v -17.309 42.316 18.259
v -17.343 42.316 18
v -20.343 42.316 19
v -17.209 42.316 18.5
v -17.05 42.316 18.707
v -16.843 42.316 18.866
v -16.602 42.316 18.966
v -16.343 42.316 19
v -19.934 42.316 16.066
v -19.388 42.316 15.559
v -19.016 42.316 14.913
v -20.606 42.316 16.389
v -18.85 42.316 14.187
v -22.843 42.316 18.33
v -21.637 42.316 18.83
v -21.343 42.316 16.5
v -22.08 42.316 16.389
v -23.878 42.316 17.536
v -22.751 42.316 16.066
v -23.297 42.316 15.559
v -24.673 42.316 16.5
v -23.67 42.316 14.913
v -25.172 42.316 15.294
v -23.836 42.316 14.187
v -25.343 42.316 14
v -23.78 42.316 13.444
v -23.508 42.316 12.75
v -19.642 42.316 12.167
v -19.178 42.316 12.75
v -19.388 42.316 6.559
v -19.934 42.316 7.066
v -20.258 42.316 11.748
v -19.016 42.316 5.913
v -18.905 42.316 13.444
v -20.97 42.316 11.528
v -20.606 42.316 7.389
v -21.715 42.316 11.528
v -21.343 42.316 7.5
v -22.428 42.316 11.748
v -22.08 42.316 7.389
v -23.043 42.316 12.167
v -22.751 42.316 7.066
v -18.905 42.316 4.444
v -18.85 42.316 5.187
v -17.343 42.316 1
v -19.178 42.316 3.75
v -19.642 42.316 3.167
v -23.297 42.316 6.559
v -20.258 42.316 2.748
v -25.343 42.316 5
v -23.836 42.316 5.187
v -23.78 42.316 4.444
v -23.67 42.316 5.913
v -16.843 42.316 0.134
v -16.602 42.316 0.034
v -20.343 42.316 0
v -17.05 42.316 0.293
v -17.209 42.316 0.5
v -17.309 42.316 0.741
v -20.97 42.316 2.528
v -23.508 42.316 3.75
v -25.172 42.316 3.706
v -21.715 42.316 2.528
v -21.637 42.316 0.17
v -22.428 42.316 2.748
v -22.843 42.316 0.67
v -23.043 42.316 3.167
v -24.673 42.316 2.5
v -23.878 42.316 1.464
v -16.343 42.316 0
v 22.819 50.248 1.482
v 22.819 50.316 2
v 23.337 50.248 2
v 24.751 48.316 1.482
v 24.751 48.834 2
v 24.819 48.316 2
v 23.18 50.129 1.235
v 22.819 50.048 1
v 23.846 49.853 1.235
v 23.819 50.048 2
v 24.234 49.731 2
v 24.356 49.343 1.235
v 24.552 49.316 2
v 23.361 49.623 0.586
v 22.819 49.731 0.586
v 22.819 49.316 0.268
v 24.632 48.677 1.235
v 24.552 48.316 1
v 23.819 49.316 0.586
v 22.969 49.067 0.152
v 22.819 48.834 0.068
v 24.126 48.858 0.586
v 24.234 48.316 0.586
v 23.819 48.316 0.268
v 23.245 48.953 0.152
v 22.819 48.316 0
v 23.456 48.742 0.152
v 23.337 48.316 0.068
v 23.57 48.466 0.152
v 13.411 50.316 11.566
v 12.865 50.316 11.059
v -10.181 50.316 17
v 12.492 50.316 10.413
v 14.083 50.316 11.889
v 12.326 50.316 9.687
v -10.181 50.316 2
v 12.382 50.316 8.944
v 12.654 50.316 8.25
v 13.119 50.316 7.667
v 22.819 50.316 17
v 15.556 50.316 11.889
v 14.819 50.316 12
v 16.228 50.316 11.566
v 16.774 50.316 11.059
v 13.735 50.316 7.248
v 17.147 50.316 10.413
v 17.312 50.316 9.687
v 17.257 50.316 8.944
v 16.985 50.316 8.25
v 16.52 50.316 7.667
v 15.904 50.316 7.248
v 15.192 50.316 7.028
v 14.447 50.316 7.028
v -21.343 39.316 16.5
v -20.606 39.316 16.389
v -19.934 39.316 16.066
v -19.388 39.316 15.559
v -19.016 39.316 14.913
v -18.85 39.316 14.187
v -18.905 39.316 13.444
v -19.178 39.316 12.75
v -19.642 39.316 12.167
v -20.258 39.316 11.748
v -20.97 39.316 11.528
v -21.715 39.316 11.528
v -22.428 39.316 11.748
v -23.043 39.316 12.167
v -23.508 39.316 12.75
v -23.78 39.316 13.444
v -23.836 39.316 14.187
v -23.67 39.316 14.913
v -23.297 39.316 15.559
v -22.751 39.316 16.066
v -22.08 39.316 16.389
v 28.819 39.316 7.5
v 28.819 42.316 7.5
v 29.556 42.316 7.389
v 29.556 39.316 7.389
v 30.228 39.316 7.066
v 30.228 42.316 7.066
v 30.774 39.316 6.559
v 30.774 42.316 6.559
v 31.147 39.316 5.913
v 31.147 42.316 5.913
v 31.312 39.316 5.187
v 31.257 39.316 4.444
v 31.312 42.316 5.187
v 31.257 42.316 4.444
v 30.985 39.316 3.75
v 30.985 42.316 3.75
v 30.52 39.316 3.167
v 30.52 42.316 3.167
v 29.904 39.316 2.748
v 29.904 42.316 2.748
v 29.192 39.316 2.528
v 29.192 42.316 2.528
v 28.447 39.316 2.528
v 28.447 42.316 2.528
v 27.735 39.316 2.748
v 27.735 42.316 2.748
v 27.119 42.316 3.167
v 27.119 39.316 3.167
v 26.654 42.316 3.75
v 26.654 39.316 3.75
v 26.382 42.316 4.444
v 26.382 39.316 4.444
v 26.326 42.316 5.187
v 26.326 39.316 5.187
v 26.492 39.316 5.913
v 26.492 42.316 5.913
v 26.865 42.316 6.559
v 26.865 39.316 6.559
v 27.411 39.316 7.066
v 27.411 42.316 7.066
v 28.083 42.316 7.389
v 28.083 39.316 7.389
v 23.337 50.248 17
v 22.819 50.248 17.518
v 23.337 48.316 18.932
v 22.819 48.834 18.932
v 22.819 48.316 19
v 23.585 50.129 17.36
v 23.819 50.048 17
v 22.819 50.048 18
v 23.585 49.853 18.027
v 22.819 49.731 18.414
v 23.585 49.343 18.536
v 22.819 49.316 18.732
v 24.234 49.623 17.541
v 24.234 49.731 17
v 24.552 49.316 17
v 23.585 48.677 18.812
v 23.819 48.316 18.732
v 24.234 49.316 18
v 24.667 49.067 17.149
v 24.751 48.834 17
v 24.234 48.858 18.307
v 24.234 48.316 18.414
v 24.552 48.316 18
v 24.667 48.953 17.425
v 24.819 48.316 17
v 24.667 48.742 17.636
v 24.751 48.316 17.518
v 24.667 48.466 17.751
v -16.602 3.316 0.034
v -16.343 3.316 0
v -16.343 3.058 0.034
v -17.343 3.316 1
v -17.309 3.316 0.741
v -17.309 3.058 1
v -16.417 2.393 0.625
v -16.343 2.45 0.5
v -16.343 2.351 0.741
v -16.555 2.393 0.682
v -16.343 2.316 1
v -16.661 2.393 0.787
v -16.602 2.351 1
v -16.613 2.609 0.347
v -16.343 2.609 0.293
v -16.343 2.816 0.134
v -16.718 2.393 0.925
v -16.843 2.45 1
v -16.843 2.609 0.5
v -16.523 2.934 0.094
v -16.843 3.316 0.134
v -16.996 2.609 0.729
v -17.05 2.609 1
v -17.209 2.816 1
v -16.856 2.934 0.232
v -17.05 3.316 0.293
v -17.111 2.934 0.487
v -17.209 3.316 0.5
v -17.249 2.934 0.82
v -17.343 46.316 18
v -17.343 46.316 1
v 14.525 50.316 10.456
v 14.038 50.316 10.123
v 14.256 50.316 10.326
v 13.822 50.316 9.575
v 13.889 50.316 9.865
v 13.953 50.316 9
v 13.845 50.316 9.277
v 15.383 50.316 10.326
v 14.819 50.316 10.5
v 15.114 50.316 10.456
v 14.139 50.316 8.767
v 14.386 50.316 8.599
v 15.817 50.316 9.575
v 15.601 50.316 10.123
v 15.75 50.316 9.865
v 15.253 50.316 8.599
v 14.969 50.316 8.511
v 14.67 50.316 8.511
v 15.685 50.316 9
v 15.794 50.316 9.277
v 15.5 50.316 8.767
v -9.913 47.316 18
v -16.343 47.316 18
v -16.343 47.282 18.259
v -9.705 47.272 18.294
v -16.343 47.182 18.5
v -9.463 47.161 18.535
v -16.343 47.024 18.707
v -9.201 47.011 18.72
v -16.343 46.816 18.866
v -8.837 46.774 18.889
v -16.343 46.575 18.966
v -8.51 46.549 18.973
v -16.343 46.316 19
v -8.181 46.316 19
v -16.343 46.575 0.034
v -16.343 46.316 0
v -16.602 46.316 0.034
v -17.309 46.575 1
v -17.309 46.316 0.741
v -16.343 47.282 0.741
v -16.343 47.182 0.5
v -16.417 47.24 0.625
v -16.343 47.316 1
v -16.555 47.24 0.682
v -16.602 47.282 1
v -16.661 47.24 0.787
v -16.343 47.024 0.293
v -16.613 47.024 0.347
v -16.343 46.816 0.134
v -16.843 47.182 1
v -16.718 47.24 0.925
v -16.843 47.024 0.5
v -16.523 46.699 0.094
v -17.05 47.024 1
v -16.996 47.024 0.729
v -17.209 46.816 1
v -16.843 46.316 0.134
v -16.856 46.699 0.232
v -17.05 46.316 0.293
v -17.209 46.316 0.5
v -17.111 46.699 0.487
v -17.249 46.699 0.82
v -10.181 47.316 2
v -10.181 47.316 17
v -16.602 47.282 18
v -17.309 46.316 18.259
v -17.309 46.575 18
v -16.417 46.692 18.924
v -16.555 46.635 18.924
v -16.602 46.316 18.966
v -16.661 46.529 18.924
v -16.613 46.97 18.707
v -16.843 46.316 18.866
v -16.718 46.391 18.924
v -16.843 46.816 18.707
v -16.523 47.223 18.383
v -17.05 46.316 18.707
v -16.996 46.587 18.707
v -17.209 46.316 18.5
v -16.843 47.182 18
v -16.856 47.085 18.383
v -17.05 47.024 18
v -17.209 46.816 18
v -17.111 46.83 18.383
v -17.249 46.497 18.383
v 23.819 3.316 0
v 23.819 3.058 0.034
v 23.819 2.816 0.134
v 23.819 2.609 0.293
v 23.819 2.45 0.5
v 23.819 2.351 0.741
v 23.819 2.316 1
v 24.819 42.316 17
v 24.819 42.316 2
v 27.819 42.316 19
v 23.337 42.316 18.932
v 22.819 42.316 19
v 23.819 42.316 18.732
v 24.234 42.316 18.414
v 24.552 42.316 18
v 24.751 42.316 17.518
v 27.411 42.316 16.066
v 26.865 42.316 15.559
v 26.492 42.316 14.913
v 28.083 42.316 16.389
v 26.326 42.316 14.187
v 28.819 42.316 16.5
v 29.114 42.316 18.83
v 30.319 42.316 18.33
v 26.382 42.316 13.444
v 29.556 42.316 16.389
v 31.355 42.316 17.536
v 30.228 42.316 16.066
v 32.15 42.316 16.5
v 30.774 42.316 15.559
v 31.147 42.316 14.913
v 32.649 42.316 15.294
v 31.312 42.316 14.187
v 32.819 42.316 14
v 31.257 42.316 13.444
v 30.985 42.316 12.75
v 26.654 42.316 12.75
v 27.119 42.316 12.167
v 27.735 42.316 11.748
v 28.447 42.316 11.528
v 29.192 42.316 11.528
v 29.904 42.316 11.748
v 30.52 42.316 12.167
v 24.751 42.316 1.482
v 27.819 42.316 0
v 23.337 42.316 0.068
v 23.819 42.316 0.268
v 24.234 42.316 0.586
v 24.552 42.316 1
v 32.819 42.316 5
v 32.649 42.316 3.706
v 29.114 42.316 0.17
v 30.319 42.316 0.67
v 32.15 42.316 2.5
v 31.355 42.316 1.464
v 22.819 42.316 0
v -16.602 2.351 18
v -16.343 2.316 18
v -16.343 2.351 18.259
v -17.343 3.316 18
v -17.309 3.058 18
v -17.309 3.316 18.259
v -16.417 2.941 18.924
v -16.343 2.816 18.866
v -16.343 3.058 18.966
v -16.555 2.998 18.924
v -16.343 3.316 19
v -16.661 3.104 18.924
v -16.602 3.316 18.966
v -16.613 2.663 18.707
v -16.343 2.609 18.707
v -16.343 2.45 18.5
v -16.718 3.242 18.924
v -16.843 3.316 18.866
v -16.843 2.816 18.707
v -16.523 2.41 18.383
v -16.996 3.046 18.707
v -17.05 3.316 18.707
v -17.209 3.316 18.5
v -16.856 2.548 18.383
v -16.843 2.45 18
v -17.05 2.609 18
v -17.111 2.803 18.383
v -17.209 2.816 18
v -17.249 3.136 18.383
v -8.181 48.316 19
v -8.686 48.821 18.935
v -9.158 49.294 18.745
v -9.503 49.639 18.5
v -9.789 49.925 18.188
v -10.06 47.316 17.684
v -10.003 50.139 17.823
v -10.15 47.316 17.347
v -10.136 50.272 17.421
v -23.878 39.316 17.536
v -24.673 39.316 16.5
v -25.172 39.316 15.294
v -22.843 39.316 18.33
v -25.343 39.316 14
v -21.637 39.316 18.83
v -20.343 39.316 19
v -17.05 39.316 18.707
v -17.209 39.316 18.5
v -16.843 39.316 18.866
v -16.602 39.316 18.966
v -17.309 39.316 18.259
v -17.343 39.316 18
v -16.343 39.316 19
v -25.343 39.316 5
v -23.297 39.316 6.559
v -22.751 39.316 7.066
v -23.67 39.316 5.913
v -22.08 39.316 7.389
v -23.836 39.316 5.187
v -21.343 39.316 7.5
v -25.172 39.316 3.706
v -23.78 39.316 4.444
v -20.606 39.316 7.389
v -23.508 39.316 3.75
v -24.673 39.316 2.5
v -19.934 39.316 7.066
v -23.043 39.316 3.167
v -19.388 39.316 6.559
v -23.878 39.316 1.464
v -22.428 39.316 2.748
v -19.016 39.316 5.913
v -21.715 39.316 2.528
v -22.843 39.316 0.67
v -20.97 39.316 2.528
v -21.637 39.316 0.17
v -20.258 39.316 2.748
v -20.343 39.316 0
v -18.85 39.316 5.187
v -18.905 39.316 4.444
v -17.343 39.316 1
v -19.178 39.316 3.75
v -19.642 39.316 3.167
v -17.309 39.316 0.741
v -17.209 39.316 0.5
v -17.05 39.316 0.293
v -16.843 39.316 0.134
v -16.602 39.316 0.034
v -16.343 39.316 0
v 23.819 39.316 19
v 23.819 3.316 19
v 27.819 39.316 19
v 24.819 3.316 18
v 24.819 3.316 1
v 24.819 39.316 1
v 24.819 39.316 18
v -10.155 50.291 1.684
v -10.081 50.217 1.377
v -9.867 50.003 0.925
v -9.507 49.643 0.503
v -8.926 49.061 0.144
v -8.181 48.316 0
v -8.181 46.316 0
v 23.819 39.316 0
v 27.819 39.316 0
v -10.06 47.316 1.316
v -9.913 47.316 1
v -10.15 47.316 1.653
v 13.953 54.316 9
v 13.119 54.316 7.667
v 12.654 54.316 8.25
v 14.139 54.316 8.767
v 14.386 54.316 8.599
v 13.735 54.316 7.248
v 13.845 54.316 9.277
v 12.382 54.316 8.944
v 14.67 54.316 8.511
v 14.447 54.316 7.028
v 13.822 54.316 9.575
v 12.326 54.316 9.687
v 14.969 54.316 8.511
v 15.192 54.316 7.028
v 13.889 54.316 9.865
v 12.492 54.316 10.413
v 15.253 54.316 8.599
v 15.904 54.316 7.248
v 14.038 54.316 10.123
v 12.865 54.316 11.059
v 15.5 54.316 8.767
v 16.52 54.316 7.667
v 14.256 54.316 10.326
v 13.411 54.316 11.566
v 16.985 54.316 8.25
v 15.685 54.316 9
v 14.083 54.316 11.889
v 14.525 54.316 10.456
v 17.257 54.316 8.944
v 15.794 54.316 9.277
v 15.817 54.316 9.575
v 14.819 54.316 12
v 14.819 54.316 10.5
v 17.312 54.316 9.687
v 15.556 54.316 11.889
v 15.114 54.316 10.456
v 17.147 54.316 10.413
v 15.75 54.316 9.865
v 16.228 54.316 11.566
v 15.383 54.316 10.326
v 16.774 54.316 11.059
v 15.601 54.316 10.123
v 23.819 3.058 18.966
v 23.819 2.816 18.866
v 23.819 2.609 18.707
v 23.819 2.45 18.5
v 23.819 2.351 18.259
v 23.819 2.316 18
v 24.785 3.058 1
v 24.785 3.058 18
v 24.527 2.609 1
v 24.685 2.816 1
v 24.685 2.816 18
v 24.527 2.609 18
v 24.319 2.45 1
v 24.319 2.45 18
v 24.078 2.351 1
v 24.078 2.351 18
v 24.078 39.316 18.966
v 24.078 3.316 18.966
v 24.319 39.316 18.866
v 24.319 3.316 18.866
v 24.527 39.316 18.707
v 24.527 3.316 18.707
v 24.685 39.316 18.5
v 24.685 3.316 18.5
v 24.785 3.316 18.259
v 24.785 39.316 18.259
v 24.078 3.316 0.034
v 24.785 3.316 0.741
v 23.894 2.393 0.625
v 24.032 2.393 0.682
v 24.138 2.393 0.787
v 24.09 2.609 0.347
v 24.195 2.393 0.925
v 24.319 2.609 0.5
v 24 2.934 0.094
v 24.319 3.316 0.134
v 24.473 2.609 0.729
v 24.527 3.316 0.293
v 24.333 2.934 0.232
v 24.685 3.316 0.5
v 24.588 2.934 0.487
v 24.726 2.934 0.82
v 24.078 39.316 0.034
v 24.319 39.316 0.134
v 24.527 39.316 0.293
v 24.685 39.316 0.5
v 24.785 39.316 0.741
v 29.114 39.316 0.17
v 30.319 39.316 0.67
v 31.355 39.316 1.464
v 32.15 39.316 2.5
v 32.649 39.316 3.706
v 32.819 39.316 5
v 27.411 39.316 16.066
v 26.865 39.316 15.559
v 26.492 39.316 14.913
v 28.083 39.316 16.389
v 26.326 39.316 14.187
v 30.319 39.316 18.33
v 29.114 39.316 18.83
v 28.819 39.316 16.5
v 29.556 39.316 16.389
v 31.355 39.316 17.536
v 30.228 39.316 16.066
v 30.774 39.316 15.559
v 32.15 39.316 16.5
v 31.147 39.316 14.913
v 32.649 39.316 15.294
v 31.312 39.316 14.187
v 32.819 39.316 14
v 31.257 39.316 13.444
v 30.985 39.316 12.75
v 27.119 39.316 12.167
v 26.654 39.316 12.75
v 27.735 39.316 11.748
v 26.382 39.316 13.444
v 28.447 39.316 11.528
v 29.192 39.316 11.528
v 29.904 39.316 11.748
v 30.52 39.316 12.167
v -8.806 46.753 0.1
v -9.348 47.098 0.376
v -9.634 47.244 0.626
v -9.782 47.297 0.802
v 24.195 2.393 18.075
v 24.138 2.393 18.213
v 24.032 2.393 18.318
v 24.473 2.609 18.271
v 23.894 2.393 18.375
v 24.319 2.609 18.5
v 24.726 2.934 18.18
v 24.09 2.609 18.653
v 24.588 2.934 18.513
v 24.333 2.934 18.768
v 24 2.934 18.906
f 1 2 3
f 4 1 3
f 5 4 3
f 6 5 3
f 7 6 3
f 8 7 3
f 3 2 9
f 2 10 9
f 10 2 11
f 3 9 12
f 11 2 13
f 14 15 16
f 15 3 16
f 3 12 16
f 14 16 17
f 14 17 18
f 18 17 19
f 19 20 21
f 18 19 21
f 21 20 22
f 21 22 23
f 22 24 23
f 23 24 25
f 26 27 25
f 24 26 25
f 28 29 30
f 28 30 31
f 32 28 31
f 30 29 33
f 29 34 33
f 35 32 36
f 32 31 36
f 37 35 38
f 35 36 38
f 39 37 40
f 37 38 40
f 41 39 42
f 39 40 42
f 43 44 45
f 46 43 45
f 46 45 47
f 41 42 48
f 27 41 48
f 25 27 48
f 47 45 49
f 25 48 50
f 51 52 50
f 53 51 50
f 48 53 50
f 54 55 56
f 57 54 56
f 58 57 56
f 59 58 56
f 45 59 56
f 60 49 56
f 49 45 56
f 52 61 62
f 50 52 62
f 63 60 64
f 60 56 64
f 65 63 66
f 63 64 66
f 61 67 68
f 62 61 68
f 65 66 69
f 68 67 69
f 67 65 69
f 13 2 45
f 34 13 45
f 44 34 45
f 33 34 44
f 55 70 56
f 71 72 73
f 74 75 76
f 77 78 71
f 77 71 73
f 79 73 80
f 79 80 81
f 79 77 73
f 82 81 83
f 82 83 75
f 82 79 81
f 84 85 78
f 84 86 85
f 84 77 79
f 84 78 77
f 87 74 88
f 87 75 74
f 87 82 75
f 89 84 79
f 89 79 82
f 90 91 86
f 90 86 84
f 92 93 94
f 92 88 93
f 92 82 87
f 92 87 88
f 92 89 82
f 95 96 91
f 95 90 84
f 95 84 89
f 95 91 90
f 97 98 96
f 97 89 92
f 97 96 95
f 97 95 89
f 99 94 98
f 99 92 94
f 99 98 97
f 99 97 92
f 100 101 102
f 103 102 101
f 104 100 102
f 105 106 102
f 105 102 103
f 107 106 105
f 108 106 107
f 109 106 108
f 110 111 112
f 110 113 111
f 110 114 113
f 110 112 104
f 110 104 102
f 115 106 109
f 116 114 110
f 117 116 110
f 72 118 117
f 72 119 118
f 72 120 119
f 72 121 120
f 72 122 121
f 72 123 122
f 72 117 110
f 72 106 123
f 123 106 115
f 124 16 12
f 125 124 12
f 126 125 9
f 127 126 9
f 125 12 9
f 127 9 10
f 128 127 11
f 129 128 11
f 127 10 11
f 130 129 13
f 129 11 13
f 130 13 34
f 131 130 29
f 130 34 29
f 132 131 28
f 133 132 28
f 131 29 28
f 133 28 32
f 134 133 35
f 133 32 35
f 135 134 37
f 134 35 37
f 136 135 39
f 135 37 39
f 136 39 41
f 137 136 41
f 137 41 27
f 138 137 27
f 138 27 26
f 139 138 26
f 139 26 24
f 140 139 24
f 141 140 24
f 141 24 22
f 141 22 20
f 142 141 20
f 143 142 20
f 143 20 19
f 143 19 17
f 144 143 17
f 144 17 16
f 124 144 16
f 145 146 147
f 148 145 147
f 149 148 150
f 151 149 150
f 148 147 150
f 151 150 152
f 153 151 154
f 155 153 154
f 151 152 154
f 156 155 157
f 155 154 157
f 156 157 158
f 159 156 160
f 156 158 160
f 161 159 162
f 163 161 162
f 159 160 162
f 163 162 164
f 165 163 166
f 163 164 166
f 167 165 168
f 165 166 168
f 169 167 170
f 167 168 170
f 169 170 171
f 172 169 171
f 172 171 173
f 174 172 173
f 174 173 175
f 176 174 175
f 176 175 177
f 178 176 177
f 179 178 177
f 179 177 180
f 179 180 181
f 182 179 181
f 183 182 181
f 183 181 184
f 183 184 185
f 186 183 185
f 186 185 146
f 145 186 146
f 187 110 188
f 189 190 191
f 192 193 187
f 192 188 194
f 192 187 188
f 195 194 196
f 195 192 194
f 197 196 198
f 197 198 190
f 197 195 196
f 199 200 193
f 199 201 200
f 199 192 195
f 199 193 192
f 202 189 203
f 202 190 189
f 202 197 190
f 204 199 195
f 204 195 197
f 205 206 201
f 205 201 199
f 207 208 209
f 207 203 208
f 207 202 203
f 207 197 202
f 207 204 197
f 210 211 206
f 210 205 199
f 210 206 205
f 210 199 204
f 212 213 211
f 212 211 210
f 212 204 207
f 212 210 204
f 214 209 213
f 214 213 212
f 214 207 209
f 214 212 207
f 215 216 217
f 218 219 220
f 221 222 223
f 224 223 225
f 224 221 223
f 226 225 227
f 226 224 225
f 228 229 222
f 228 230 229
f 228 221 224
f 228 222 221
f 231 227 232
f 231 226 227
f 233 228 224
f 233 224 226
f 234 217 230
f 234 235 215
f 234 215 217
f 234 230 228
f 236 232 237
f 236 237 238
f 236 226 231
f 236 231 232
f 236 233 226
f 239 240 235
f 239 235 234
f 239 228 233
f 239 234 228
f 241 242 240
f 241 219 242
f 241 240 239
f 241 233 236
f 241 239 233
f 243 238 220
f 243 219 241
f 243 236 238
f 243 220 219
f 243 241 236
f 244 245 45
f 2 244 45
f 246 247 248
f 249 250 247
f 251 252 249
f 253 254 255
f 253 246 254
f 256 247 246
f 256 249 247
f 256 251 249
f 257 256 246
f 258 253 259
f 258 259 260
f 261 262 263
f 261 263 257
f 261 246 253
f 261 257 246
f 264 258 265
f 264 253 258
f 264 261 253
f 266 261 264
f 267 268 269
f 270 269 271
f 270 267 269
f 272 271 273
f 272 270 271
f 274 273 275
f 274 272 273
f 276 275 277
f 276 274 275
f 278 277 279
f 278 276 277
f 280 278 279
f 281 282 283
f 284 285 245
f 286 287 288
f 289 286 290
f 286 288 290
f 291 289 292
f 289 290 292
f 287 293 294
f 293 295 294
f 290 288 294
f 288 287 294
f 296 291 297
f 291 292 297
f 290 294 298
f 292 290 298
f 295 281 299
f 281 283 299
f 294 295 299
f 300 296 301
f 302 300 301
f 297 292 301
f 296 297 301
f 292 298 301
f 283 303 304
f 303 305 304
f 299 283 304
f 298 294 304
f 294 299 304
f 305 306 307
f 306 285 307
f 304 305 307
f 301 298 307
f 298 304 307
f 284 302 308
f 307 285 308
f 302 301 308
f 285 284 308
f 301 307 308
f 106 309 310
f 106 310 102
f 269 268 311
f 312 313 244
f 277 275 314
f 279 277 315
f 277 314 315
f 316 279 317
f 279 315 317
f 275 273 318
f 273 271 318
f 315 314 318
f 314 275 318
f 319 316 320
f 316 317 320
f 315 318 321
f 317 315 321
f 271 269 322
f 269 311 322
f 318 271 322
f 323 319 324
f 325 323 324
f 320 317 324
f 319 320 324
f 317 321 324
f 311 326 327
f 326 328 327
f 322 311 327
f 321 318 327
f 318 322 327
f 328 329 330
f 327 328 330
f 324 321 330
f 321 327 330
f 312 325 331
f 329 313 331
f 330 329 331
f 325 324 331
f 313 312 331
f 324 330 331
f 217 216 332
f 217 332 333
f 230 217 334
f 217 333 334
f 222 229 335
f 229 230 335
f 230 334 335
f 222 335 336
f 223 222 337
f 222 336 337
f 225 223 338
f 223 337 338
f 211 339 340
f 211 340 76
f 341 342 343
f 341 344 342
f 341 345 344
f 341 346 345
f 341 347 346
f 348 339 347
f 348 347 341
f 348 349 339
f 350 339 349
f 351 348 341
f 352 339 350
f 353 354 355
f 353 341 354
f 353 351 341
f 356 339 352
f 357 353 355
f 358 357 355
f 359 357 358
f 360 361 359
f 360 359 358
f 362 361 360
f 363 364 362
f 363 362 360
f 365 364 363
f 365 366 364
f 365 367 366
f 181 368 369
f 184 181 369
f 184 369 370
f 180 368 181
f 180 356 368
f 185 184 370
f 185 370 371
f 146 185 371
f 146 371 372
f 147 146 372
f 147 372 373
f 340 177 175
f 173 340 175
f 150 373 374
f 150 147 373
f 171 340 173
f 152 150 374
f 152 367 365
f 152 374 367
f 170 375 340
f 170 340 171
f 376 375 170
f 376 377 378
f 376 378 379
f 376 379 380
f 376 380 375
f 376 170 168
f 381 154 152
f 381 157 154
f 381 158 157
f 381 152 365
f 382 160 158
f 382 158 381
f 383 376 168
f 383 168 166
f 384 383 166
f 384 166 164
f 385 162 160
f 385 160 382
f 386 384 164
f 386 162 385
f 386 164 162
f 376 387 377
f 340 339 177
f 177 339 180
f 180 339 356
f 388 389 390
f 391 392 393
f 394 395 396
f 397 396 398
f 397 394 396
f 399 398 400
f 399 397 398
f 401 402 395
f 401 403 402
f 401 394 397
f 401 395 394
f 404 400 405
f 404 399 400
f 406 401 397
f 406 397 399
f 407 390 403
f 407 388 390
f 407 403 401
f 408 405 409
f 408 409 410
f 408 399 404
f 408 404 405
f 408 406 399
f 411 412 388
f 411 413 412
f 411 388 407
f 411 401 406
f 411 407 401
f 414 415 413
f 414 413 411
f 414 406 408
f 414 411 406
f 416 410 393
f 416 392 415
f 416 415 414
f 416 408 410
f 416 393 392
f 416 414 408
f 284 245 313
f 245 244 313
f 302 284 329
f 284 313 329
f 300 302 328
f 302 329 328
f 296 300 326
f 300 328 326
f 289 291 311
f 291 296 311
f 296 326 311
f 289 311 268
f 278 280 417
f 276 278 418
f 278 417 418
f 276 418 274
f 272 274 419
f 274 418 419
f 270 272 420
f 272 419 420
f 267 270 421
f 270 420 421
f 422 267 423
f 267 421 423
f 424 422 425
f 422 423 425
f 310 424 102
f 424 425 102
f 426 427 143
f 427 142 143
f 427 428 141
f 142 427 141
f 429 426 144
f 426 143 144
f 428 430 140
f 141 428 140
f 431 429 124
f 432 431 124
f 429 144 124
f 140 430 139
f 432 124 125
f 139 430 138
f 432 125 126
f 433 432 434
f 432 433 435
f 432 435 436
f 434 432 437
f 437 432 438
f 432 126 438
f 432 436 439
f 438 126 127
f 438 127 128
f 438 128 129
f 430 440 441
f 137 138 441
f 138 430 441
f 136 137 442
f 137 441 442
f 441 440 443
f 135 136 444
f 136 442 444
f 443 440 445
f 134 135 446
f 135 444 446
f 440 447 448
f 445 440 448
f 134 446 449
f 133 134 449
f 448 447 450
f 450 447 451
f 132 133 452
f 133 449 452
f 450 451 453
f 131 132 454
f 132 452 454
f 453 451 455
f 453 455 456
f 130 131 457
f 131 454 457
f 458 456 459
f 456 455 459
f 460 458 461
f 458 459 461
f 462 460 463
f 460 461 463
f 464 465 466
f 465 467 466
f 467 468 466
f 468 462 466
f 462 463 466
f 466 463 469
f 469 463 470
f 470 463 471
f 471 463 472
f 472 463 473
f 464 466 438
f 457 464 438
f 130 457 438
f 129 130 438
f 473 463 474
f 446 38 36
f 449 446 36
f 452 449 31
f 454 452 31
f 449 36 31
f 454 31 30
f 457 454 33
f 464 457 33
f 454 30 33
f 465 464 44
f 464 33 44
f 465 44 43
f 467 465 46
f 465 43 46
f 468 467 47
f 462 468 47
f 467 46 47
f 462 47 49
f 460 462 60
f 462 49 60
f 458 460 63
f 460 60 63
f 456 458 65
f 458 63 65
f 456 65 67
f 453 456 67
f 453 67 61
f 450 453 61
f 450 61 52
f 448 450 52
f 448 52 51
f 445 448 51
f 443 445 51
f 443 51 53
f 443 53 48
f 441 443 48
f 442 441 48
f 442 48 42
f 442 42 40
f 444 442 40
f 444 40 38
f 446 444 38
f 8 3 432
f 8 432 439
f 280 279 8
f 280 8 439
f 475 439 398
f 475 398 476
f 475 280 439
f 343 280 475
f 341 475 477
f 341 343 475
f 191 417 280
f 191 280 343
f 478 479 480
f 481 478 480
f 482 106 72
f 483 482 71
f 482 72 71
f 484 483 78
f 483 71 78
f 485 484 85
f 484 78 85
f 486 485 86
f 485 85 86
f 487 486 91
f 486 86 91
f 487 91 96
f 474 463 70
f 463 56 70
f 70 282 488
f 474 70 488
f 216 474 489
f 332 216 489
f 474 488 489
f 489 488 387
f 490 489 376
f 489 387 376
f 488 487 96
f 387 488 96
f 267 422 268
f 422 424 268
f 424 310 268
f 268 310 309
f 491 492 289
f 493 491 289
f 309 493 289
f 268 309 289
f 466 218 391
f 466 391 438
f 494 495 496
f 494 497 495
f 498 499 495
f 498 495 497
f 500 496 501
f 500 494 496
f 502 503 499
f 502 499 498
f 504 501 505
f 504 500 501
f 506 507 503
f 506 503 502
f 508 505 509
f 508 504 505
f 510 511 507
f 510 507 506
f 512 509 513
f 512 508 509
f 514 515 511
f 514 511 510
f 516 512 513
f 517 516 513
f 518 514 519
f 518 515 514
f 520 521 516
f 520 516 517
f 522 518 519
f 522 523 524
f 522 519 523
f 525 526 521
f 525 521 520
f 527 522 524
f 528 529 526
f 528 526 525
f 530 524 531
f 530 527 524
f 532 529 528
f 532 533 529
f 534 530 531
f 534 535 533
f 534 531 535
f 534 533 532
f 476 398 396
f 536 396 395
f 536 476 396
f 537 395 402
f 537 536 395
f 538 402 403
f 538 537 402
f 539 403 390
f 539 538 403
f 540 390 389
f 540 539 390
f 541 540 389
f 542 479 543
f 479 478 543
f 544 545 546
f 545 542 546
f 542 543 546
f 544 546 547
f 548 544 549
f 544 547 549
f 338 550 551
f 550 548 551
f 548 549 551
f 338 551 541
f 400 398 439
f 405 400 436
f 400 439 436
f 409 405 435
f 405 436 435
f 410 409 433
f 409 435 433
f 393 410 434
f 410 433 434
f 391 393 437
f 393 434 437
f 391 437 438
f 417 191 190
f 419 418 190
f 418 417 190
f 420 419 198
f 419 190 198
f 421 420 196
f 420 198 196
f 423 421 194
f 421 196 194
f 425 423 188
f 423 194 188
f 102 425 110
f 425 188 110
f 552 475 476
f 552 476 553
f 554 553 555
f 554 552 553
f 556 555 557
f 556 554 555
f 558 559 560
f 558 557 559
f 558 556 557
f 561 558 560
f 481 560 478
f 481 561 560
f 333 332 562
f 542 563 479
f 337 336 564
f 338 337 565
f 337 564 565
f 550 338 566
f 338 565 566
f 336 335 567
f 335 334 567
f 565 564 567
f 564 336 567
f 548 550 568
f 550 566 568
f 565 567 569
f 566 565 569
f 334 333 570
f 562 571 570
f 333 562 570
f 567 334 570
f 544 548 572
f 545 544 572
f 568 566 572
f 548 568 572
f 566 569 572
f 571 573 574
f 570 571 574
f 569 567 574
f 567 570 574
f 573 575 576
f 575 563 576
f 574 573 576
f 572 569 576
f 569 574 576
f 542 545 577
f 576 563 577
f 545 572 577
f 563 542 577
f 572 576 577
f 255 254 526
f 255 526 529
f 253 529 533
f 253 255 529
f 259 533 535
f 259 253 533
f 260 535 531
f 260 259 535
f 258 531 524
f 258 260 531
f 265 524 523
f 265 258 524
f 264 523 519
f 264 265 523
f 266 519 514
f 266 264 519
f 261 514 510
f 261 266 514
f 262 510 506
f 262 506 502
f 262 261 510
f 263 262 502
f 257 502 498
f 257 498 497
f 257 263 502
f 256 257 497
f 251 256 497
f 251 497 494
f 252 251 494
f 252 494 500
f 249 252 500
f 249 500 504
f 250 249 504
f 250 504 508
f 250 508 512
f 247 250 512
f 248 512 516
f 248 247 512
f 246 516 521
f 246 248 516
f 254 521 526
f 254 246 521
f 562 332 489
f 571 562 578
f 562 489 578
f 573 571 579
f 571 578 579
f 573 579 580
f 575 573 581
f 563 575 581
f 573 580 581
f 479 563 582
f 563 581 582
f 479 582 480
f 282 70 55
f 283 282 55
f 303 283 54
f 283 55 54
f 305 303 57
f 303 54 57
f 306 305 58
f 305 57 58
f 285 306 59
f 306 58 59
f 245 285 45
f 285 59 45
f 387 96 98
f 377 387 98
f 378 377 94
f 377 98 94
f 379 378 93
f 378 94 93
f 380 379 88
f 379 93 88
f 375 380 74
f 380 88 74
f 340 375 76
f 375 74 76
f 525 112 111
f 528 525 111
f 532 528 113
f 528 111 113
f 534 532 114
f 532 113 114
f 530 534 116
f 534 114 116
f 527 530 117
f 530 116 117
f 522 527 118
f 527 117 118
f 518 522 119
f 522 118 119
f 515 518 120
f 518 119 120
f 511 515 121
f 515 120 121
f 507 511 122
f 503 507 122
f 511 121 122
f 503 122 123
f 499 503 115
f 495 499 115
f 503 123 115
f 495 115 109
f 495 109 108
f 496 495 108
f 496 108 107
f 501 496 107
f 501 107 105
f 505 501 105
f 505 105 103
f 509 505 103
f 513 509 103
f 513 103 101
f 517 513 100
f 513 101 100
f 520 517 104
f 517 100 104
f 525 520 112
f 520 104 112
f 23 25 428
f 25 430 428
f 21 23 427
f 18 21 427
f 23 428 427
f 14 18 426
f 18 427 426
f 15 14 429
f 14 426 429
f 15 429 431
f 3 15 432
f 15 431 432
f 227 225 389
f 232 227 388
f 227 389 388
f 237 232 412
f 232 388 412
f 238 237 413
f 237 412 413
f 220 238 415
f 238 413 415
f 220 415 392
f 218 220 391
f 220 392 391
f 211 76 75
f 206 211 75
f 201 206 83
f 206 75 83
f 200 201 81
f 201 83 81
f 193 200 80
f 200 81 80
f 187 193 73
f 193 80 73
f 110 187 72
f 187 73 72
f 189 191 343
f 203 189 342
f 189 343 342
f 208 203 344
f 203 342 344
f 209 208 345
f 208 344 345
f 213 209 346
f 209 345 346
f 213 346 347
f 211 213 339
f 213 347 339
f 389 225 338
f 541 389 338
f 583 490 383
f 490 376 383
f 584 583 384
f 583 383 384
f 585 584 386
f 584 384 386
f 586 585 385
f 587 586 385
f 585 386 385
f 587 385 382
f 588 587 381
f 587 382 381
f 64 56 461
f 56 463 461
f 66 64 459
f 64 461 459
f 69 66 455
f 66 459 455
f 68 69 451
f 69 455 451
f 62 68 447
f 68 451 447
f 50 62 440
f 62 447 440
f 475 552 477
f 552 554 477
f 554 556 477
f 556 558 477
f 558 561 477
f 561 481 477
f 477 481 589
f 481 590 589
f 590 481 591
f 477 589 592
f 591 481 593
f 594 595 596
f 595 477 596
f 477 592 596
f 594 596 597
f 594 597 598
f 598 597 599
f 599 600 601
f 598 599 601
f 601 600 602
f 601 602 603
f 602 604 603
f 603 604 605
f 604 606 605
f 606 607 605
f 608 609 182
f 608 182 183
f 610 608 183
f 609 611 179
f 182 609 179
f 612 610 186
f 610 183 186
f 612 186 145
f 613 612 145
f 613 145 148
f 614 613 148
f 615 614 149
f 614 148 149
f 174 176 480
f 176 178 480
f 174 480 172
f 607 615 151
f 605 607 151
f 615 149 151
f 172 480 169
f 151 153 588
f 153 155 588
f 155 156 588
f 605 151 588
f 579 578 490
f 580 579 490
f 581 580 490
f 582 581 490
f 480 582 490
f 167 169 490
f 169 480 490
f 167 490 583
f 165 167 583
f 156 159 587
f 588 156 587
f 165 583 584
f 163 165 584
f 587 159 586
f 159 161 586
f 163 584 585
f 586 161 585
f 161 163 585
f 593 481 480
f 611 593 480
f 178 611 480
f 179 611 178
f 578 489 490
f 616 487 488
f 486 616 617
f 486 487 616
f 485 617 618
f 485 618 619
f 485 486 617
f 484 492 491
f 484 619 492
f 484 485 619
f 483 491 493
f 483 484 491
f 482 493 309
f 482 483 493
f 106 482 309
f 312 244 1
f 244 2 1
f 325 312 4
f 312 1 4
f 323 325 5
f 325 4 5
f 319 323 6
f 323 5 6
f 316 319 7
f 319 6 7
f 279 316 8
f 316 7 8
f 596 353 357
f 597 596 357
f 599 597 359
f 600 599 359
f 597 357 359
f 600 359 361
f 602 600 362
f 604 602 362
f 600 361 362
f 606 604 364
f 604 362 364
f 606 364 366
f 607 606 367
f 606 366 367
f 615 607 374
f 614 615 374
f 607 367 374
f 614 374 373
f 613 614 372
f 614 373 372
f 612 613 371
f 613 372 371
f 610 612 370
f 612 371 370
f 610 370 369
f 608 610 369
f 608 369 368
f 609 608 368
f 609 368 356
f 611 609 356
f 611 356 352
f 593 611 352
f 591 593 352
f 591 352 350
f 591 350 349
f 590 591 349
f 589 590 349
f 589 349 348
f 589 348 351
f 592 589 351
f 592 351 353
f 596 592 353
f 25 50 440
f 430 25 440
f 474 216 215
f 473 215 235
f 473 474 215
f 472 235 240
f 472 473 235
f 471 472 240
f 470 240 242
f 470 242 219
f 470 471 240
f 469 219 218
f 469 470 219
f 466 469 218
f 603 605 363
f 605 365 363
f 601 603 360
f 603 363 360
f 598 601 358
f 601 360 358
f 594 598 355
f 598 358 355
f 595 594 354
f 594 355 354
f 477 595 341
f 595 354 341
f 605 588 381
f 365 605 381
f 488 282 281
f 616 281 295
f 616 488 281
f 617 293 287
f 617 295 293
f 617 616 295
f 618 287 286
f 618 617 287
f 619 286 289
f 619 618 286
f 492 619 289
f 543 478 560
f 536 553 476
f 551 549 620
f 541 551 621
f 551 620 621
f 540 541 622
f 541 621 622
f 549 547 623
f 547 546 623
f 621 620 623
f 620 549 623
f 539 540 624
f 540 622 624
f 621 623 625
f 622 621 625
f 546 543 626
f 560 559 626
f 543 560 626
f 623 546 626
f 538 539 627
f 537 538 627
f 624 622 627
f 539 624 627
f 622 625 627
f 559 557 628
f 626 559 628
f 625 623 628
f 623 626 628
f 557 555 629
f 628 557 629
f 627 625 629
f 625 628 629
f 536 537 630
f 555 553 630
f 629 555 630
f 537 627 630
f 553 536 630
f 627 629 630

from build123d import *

# Parameters (mm, degrees)
SKETCH1_W           = 42.162271806
SKETCH1_H           = 37
SKETCH1_W_2         = 35
SKETCH1_H_2         = 3
BOSS_EXTRUDE1_DEPTH = 19
SKETCH2_R           = 2.5
CUT_EXTRUDE1_DEPTH  = 19
SKETCH4_R           = 2.5
SKETCH4_R_2         = 1
BOSS_EXTRUDE2_DEPTH = 4
FILLET1_R           = 2
FILLET2_R           = 2
FILLET3_R           = 5
FILLET4_R           = 1
FILLET5_R           = 1


with BuildPart() as part:
    # Sketch1 → Boss-Extrude1 (new body)
    with BuildSketch(Plane.XY):
        with Locations((3.738336714, 20.81643002)):
            Rectangle(SKETCH1_W, SKETCH1_H)
        Polygon((-25.342799189, 39.31643002), (-17.342799189, 39.31643002), (24.819472617, 39.31643002), (32.819472617, 39.31643002), (32.819472617, 42.31643002), (24.819472617, 42.31643002), (-17.342799189, 42.31643002), (-25.342799189, 42.31643002), align=None)
        Polygon((-17.342799189, 47.31643002), (-17.342799189, 42.31643002), (24.819472617, 42.31643002), (24.819472617, 47.31643002), (-10.180527383, 47.31643002), align=None)
        with Locations((7.319472617, 48.81643002)):
            Rectangle(SKETCH1_W_2, SKETCH1_H_2)
    extrude(amount=BOSS_EXTRUDE1_DEPTH)

    # Sketch2 → Cut-Extrude1 (cut)
    with BuildSketch(Plane(origin=(0, 42.31643002, 0), x_dir=(1, 0, 0), z_dir=(0, 1, 0))):
        with Locations(Location((-21.342799189, -14, 0), (0, 0, 270))):
            Circle(SKETCH2_R)
        with Locations(Location((-21.342799189, -5, 0), (0, 0, 270))):
            Circle(SKETCH2_R)
        with Locations(Location((28.819472617, -5, 0), (0, 0, 270))):
            Circle(SKETCH2_R)
        with Locations(Location((28.819472617, -14, 0), (0, 0, 270))):
            Circle(SKETCH2_R)
    extrude(amount=-CUT_EXTRUDE1_DEPTH, mode=Mode.SUBTRACT)

    # Sketch4 → Boss-Extrude2 (add)
    with BuildSketch(Plane(origin=(0, 50.31643002, 0), x_dir=(1, 0, 0), z_dir=(0, 1, 0))):
        with Locations(Location((14.819472617, -9.5, 0), (0, 0, 270))):
            Circle(SKETCH4_R)
        with Locations(Location((14.819472617, -9.5, 0), (0, 0, 270))):
            Circle(SKETCH4_R_2, mode=Mode.SUBTRACT)
    extrude(amount=BOSS_EXTRUDE2_DEPTH)

    # Fillet1
    fillet1_edges = [part.edges().sort_by_distance(p)[0] for p in [
        (-10.180527383, 48.81643002, 0),
        (-10.180527383, 48.81643002, 19),
    ]]
    fillet(fillet1_edges, radius=FILLET1_R)

    # Fillet2
    # the kernel refuses this fillet: 2 mm, written as the material it takes off along each edge
    with BuildSketch(Plane(origin=(22.819472617, 48.31643002, 2), x_dir=(1, 0, 0), z_dir=(0, 0, -1))) as fillet2_piece_1_section:
        Polygon((0, 0), (FILLET2_R * 1.02, 0), (FILLET2_R * 1.02, -FILLET2_R * 1.02), (0, -FILLET2_R * 1.02), align=None)
    fillet2_piece_1 = extrude(amount=FILLET2_R * 1.02, mode=Mode.PRIVATE)
    fillet2_piece_1 = fillet2_piece_1 - Plane(origin=(22.819472617, 48.31643002, 2), x_dir=(-0.7071067811865475, -0.7071067811865475, 0), z_dir=(0, 0, -1)) * Sphere(FILLET2_R, mode=Mode.PRIVATE)
    add(fillet2_piece_1, mode=Mode.SUBTRACT)
    with BuildSketch(Plane(origin=(22.819472617, 48.31643002, 17), x_dir=(0, 0, 1), z_dir=(1, 0, 0))) as fillet2_piece_2_section:
        Polygon((0, 0), (FILLET2_R * 1.02, 0), (FILLET2_R * 1.02, -FILLET2_R * 1.02), (0, -FILLET2_R * 1.02), align=None)
    fillet2_piece_2 = extrude(amount=FILLET2_R * 1.02, mode=Mode.PRIVATE)
    fillet2_piece_2 = fillet2_piece_2 - Plane(origin=(22.819472617, 48.31643002, 17), x_dir=(0, -0.7071067811865475, -0.7071067811865475), z_dir=(1, 0, 0)) * Sphere(FILLET2_R, mode=Mode.PRIVATE)
    add(fillet2_piece_2, mode=Mode.SUBTRACT)
    with BuildSketch(Plane(origin=(22.819472617, 50.31643002, 0), x_dir=(0, -1, 0), z_dir=(-1, 0, 0))) as fillet2_piece_3:
        with BuildLine():
            CenterArc((FILLET2_R, FILLET2_R), FILLET2_R, 180, 90)
            Line((0, FILLET2_R), (0, 0))
            Line((0, 0), (FILLET2_R, 0))
        make_face()
    extrude(amount=36, mode=Mode.SUBTRACT)
    with BuildSketch(Plane(origin=(24.819472617, 48.31643002, 0), x_dir=(-1, 0, 0), z_dir=(0, -1, 0))) as fillet2_piece_4:
        with BuildLine():
            CenterArc((FILLET2_R, -FILLET2_R), FILLET2_R, 90, 90)
            Line((0, -FILLET2_R), (0, 0))
            Line((0, 0), (FILLET2_R, 0))
        make_face()
    extrude(amount=6, mode=Mode.SUBTRACT)
    with BuildSketch(Plane(origin=(24.819472617, 42.31643002, 19), x_dir=(0, 0, -1), z_dir=(0, 1, 0))) as fillet2_piece_5:
        with BuildLine():
            CenterArc((FILLET2_R, FILLET2_R), FILLET2_R, 180, 90)
            Line((0, FILLET2_R), (0, 0))
            Line((0, 0), (FILLET2_R, 0))
        make_face()
    extrude(amount=6, mode=Mode.SUBTRACT)
    with BuildSketch(Plane(origin=(22.819472617, 50.31643002, 19), x_dir=(0, -1, 0), z_dir=(-1, 0, 0))) as fillet2_piece_6:
        with BuildLine():
            CenterArc((FILLET2_R, -FILLET2_R), FILLET2_R, 90, 90)
            Line((0, -FILLET2_R), (0, 0))
            Line((0, 0), (FILLET2_R, 0))
        make_face()
    extrude(amount=36, mode=Mode.SUBTRACT)
    with BuildSketch(Plane(origin=(24.819472617, 50.31643002, 2), x_dir=(0, -1, 0), z_dir=(0, 0, 1))) as fillet2_piece_7:
        with BuildLine():
            CenterArc((FILLET2_R, -FILLET2_R), FILLET2_R, 90, 90)
            Line((0, -FILLET2_R), (0, 0))
            Line((0, 0), (FILLET2_R, 0))
        make_face()
    extrude(amount=15, mode=Mode.SUBTRACT)

    # Fillet3
    fillet3_edges = [part.edges().sort_by_distance(p)[0] for p in [
        (-25.342799189, 40.81643002, 0),
        (32.819472617, 40.81643002, 19),
        (32.819472617, 40.81643002, 0),
        (-25.342799189, 40.81643002, 19),
    ]]
    fillet(fillet3_edges, radius=FILLET3_R)

    # Fillet4
    fillet4_edges = [part.edges().sort_by_distance(p)[0] for p in [
        (-17.342799189, 44.81643002, 0),
        (-12.761663286, 47.31643002, 0),
        (-17.342799189, 47.31643002, 9.5),
        (-12.761663286, 47.31643002, 19),
        (-17.342799189, 44.81643002, 19),
    ]]
    fillet(fillet4_edges, radius=FILLET4_R)

    # Fillet5
    fillet5_edges = [part.edges().sort_by_distance(p)[0] for p in [
        (24.819472617, 20.81643002, 19),
        (-17.342799189, 20.81643002, 0),
        (24.819472617, 20.81643002, 0),
        (3.738336714, 2.31643002, 0),
        (-17.342799189, 2.31643002, 9.5),
        (24.819472617, 2.31643002, 9.5),
        (3.738336714, 2.31643002, 19),
        (-17.342799189, 20.81643002, 19),
    ]]
    fillet(fillet5_edges, radius=FILLET5_R)


solid = part.part
